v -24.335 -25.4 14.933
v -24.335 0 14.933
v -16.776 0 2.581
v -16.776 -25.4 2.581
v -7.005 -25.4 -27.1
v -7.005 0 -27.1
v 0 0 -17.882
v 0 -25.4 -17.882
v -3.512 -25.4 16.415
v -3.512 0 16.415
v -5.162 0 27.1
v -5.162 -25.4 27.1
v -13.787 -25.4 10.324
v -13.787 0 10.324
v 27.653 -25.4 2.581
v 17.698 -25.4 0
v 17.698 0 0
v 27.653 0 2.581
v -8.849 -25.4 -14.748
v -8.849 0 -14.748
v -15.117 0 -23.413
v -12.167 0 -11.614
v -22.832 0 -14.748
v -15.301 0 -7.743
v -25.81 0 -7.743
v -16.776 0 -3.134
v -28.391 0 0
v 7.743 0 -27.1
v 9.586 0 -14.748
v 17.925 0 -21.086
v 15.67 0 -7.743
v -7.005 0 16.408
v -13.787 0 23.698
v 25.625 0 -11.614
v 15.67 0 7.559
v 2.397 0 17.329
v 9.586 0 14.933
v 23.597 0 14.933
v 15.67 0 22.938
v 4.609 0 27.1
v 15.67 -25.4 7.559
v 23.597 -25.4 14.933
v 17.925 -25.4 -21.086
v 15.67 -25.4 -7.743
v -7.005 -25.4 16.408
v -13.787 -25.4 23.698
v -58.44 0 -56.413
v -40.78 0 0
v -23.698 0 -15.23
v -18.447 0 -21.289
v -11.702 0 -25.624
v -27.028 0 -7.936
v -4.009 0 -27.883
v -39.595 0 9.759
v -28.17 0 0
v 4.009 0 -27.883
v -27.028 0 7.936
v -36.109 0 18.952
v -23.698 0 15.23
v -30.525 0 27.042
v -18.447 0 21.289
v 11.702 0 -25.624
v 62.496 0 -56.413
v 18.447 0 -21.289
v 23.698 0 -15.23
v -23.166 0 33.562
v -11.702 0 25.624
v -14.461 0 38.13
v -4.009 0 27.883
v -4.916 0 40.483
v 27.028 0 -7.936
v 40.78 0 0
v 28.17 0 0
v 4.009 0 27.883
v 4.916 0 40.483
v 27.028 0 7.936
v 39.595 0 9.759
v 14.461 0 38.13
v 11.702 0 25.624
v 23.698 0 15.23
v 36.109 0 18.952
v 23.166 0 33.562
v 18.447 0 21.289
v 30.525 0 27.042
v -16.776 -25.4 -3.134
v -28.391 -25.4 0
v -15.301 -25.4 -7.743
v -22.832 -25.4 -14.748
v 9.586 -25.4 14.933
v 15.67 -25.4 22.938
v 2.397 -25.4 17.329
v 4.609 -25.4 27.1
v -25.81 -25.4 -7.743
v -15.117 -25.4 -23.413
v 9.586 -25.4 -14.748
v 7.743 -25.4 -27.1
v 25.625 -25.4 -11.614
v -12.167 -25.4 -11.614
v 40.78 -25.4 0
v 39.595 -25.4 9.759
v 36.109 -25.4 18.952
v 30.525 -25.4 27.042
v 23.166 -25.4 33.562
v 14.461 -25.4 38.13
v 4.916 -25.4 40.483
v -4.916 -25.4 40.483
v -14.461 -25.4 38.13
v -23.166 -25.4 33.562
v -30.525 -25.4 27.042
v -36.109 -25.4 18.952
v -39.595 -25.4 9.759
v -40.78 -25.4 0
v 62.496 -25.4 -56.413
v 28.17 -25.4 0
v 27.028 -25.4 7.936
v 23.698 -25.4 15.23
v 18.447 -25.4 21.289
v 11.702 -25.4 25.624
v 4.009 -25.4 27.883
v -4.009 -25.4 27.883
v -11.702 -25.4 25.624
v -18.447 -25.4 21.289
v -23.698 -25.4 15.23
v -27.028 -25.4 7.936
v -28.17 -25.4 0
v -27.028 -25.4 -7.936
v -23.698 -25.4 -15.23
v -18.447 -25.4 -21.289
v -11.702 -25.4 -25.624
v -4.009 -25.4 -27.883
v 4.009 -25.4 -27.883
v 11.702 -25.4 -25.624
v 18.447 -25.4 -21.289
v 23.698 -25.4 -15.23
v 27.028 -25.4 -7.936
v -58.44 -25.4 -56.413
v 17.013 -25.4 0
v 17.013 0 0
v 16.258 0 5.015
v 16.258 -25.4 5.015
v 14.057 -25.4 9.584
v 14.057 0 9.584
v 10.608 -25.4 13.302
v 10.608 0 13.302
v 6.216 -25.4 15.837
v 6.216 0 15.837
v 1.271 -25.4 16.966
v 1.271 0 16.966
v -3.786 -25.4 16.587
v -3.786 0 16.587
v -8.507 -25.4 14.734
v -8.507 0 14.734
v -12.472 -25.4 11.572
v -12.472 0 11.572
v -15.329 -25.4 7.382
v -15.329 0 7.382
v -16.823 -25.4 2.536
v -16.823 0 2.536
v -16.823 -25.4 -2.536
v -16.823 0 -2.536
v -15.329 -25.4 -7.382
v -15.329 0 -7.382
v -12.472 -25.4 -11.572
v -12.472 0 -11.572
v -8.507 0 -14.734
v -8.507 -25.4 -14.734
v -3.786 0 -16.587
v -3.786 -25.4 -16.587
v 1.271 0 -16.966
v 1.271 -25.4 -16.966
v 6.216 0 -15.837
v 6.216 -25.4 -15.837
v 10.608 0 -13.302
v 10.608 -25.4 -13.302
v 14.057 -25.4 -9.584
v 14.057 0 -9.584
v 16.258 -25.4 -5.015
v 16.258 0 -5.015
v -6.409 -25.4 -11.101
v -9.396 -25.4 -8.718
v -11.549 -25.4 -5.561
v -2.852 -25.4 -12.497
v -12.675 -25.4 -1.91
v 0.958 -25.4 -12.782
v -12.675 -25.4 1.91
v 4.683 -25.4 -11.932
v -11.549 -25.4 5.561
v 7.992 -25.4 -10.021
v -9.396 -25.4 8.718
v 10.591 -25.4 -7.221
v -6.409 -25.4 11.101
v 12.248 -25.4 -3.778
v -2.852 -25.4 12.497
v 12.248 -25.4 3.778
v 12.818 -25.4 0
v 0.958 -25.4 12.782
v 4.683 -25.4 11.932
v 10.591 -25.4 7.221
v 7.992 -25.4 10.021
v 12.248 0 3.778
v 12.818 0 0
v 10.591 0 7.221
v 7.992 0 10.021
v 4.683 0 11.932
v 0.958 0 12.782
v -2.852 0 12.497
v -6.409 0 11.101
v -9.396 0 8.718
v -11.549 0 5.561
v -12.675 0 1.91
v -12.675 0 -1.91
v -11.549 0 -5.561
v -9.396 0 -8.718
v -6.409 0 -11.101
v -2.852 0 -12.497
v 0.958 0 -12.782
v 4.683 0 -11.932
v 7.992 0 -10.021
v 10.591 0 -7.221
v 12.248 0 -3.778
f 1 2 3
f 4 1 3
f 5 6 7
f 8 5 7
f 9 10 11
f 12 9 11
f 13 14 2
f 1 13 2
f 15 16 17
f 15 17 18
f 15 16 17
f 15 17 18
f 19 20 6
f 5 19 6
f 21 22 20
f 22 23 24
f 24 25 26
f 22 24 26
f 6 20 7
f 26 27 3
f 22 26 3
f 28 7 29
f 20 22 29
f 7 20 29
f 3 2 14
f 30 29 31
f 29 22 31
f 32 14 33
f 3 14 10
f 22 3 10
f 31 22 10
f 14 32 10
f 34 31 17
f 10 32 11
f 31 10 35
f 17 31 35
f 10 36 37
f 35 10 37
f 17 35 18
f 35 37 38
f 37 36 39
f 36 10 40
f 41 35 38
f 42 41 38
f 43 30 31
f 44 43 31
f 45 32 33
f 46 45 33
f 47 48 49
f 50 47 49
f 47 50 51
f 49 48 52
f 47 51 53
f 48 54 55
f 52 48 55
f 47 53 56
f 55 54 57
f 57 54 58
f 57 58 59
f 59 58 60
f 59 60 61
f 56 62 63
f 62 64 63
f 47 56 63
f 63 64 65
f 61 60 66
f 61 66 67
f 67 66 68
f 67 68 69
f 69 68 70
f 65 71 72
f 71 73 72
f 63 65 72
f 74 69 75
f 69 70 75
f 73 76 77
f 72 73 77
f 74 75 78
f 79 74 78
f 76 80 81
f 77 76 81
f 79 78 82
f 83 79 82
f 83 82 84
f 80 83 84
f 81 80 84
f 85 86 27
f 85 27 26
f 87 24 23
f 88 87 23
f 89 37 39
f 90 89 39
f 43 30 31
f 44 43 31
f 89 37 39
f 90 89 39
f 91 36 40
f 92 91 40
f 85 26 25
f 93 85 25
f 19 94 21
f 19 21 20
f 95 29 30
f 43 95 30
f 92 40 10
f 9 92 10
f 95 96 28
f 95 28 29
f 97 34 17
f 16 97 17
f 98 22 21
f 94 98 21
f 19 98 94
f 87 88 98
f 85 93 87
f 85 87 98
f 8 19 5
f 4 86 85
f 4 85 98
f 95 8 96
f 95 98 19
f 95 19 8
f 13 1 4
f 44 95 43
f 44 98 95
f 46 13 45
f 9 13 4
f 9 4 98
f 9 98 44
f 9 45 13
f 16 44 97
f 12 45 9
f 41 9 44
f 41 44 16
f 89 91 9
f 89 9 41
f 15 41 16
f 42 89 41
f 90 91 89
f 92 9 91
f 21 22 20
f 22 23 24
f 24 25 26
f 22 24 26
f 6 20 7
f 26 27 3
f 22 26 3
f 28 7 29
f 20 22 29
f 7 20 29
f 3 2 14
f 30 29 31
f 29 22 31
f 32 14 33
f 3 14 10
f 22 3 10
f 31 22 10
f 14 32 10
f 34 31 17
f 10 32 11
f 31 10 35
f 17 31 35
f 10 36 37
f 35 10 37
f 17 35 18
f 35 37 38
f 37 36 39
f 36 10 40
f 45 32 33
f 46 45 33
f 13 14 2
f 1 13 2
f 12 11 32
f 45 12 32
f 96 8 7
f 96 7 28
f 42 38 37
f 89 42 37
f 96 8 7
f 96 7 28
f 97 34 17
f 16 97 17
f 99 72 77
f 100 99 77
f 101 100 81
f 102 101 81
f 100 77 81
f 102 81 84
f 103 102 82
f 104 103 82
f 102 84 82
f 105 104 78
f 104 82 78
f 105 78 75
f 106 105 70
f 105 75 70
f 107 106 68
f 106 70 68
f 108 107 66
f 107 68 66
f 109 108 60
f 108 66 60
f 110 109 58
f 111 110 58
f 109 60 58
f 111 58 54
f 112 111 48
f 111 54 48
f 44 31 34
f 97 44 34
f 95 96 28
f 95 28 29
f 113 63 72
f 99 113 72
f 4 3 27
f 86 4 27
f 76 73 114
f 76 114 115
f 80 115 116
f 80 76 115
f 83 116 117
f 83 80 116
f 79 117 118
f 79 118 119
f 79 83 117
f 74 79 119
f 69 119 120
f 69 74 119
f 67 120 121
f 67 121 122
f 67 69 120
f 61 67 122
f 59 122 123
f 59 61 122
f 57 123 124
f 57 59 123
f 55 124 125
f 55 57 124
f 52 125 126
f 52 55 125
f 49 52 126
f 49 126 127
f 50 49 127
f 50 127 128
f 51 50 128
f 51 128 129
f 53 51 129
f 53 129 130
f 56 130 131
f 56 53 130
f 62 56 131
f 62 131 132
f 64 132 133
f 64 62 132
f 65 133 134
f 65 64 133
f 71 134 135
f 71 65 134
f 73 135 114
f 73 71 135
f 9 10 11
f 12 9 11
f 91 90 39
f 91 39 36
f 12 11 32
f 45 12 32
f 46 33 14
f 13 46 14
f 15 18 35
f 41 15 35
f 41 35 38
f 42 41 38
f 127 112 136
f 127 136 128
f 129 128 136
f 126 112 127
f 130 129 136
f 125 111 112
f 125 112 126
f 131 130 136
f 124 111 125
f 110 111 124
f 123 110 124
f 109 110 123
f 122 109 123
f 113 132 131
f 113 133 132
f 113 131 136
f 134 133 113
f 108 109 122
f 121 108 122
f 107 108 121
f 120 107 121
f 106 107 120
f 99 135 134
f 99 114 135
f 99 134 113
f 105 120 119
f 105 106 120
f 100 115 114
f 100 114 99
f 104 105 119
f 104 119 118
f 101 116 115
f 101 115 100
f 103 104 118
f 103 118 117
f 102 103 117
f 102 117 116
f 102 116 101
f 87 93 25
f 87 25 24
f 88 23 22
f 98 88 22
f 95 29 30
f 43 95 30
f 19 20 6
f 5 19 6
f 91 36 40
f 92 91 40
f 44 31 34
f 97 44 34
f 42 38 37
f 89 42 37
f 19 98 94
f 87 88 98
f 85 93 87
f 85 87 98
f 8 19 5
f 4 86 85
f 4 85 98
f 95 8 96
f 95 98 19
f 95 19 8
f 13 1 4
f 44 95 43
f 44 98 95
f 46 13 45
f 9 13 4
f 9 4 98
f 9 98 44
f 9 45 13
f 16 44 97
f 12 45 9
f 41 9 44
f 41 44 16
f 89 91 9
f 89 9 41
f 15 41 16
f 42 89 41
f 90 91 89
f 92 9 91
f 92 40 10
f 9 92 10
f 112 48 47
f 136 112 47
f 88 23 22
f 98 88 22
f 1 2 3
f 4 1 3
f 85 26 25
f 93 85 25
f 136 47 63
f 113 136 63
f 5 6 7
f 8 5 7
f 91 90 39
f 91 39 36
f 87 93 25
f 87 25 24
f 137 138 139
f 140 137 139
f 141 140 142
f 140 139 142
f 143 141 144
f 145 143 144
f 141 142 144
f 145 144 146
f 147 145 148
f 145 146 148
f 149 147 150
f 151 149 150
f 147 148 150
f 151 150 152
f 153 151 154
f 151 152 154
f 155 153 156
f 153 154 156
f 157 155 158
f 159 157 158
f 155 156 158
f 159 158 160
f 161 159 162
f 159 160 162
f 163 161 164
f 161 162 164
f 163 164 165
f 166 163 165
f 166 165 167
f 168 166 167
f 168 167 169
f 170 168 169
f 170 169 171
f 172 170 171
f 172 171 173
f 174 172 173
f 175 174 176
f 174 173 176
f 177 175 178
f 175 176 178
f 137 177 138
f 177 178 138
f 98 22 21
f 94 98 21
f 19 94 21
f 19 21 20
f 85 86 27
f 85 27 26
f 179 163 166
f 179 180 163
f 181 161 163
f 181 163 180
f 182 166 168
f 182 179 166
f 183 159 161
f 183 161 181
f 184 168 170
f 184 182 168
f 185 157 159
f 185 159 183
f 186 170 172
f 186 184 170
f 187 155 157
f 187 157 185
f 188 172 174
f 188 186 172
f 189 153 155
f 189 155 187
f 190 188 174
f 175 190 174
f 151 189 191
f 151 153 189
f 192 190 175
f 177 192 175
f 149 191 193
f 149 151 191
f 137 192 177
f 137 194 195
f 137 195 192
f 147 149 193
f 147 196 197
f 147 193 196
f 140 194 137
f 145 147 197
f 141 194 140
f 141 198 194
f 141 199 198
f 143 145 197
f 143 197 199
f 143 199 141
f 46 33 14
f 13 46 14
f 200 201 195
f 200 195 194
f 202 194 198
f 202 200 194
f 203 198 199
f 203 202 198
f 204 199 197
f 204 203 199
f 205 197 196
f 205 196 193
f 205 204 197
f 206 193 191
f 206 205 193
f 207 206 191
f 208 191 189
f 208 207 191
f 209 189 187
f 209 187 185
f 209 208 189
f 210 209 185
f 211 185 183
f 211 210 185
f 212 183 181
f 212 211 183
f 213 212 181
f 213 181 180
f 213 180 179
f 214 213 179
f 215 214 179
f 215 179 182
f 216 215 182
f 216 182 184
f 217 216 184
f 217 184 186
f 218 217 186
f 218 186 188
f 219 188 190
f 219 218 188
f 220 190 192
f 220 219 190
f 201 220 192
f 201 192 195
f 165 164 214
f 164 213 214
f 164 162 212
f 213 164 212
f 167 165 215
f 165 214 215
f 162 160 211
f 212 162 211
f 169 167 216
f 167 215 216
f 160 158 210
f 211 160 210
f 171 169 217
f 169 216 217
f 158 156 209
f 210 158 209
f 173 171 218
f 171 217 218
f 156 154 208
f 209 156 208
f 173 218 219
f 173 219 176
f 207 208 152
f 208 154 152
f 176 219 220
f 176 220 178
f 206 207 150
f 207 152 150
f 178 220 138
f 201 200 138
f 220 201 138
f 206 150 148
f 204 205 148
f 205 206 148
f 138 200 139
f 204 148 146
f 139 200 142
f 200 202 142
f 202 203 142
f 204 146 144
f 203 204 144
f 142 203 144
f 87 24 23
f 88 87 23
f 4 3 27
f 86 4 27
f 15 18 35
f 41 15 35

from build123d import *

# Parameters (mm, degrees)
F0_R     = 28.169514
F1_DEPTH = 25.4
F2_R     = 17.013405
F2_R_2   = 12.817933
F3_DEPTH = 25.4
F5_DEPTH = 25.4
F6_DEPTH = 25.4


with BuildPart() as f1:
    # F0 (on Front) → F1 (new body)
    with BuildSketch(Plane.XZ):
        with BuildLine():
            ThreePointArc((-40.780358, 0), (0, -40.780358), (40.780358, 0))
            ThreePointArc((40.780358, 0), (0, 40.780358), (-40.780358, 0))
        make_face()
        Circle(F0_R, mode=Mode.SUBTRACT)
        with BuildLine():
            Line((62.49629, -56.412581), (40.780358, 0))
            ThreePointArc((40.780358, 0), (0, -40.780358), (-40.780358, 0))
            Line((-40.780358, 0), (-58.440484, -56.412581))
            Line((-58.440484, -56.412581), (62.49629, -56.412581))
        make_face()
    extrude(amount=F1_DEPTH)


with BuildPart() as f3:
    # F2 (on Front) → F3 (new body)
    with BuildSketch(Plane.XZ):
        Circle(F2_R)
        Circle(F2_R_2, mode=Mode.SUBTRACT)
    extrude(amount=F3_DEPTH)


with BuildPart() as f5:
    # F4 (on Front) → F5 (new body)
    with BuildSketch(Plane.XZ):
        Polygon((-12.167419, -11.614354), (-15.117097, -23.413066), (-8.849032, -14.748388), (-7.005484, -27.100163), (0, -17.88242), (7.742902, -27.100163), (9.586452, -14.748388), (17.925423, -21.086006), (15.67016, -7.742903), (25.625324, -11.614354), (17.698064, 0), (27.653225, 2.580968), (15.67016, 7.558548), (23.597419, 14.932741), (9.586452, 14.932741), (15.67016, 22.937621), (2.396613, 17.329356), (4.60887, 27.100163), (-3.512091, 16.414687), (-5.161935, 27.100163), (-7.005484, 16.407581), (-13.787432, 23.698177), (-13.787432, 10.323871), (-24.334839, 14.932741), (-16.77629, 2.580968), (-28.390646, 0), (-16.77629, -3.134032), (-25.809677, -7.742903), (-15.301452, -7.742903), (-22.83235, -14.748388), align=None)
    extrude(amount=F5_DEPTH)


with BuildPart() as f6:
    # F4 (on Front) → F6 (new body)
    with BuildSketch(Plane.XZ):
        Polygon((-12.167419, -11.614354), (-15.117097, -23.413066), (-8.849032, -14.748388), (-7.005484, -27.100163), (0, -17.88242), (7.742902, -27.100163), (9.586452, -14.748388), (17.925423, -21.086006), (15.67016, -7.742903), (25.625324, -11.614354), (17.698064, 0), (27.653225, 2.580968), (15.67016, 7.558548), (23.597419, 14.932741), (9.586452, 14.932741), (15.67016, 22.937621), (2.396613, 17.329356), (4.60887, 27.100163), (-3.512091, 16.414687), (-5.161935, 27.100163), (-7.005484, 16.407581), (-13.787432, 23.698177), (-13.787432, 10.323871), (-24.334839, 14.932741), (-16.77629, 2.580968), (-28.390646, 0), (-16.77629, -3.134032), (-25.809677, -7.742903), (-15.301452, -7.742903), (-22.83235, -14.748388), align=None)
    extrude(amount=F6_DEPTH)


solid = Compound([f1.part, f3.part, f5.part, f6.part])
